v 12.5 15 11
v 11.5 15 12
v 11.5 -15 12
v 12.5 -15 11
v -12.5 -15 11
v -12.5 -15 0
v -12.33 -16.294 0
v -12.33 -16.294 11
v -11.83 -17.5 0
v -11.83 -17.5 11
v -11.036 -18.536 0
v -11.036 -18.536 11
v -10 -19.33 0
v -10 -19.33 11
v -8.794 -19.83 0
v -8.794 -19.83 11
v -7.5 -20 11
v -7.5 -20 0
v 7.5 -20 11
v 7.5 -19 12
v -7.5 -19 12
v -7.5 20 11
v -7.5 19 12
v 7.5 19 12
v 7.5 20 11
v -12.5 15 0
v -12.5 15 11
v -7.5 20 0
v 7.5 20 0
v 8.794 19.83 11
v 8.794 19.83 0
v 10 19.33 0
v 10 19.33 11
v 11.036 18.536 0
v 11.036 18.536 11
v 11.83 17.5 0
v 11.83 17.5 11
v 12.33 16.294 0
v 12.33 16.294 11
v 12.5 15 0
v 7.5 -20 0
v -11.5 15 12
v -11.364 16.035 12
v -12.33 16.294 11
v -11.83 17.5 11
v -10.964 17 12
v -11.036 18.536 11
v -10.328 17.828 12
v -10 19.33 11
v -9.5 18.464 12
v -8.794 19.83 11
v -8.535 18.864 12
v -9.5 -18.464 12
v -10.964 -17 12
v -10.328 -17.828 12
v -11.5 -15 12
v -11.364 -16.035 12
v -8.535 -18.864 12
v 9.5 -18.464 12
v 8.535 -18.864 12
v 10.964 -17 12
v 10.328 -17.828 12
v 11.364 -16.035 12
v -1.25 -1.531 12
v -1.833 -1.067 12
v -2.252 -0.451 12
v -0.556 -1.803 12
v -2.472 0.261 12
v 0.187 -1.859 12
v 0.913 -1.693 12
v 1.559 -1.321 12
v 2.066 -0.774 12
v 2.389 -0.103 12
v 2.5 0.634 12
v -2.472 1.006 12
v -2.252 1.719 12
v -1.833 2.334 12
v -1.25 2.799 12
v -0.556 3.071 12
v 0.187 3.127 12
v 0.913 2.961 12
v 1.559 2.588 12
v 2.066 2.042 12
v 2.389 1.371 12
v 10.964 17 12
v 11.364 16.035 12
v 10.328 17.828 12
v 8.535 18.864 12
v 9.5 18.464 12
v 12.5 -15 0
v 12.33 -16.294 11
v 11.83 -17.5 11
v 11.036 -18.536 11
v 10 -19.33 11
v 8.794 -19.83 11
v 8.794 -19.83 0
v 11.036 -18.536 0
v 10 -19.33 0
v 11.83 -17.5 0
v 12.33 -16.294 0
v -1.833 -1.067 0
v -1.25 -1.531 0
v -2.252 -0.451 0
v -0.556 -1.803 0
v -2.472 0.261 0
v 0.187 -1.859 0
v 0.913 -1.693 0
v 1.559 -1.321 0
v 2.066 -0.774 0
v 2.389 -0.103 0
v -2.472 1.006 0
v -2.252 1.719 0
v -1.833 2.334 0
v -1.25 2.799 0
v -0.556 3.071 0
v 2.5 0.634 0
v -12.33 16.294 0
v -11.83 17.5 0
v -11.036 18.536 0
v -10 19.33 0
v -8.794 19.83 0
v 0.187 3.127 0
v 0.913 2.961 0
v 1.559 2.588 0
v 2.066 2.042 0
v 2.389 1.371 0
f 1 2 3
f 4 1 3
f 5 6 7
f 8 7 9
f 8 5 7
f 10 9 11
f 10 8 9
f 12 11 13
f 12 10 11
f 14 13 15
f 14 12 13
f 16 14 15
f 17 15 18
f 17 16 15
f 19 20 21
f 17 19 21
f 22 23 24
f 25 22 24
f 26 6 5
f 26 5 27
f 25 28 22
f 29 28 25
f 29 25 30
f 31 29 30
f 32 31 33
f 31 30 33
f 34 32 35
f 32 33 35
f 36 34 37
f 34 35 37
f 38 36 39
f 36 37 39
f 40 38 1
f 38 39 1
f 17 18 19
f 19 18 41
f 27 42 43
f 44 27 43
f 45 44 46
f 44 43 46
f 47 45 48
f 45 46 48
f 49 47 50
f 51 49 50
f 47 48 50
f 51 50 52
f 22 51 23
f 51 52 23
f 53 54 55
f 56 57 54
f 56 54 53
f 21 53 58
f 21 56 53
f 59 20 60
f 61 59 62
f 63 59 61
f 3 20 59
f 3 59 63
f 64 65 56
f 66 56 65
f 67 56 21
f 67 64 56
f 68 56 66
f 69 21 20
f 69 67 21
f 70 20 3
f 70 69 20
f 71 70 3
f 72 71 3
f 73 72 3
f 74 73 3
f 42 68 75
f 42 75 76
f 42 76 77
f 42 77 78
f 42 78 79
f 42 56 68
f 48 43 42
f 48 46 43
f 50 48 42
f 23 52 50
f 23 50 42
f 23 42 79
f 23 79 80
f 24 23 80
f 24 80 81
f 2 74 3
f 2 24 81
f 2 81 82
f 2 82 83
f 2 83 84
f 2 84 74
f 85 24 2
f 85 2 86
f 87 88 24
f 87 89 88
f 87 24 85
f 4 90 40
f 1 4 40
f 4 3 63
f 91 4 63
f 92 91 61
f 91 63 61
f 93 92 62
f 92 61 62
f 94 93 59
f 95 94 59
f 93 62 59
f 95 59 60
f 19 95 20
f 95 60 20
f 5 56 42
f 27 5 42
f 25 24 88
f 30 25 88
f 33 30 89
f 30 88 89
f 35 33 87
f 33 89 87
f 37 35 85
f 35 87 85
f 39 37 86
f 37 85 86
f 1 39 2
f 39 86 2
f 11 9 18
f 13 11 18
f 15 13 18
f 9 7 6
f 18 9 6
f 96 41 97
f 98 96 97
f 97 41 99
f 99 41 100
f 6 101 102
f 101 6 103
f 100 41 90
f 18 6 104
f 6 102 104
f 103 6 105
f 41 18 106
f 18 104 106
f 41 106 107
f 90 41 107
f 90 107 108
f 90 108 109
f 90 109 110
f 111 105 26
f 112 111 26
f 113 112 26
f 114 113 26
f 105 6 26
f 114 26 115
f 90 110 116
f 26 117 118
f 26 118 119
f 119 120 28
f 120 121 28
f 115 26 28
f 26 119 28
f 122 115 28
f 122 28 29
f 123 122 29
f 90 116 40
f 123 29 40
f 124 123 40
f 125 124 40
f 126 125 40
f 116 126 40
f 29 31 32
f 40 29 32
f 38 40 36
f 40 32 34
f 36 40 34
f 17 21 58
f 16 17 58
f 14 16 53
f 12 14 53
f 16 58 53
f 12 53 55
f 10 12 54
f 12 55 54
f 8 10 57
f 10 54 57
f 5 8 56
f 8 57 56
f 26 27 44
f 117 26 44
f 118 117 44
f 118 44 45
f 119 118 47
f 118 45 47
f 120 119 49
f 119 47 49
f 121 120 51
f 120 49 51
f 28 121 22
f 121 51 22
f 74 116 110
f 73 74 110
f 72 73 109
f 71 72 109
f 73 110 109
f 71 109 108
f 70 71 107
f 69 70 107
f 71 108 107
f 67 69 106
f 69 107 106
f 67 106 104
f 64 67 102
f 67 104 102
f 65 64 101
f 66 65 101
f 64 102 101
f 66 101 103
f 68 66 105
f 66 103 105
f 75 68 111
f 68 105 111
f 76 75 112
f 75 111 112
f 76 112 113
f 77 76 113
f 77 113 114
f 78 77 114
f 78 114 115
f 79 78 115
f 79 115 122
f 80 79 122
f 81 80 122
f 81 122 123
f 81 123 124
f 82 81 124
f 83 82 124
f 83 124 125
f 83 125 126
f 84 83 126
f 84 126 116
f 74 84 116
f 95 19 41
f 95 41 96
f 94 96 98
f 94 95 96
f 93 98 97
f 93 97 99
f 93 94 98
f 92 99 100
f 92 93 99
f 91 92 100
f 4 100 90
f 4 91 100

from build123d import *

# Parameters (mm, degrees)
F0_W     = 25
F0_H     = 40
F1_DEPTH = 12
F2_R     = 2.5
F3_DEPTH = 123.8
F4_R     = 5
F5_R     = 5
F6_R     = 5
F7_R     = 5
F8_SIZE  = 1


with BuildPart() as f1:
    # F0 (on Top) → F1 (new body)
    with BuildSketch(Plane.XY):
        Rectangle(F0_W, F0_H)
    extrude(amount=F1_DEPTH)

    # F2 (on face) → F3 (cut)
    with BuildSketch(Plane(origin=(0, 0, 0), x_dir=(1, 0, 0), z_dir=(0, 0, -1))):
        with Locations((0, -0.633842)):
            Circle(F2_R)
    extrude(amount=-F3_DEPTH, mode=Mode.SUBTRACT)

    # F4
    f4_edges = [f1.edges().sort_by_distance(p)[0] for p in [
        (-12.5, -20, 6),
    ]]
    fillet(f4_edges, radius=F4_R)

    # F5
    f5_edges = [f1.edges().sort_by_distance(p)[0] for p in [
        (12.5, -20, 6),
    ]]
    fillet(f5_edges, radius=F5_R)

    # F6
    f6_edges = [f1.edges().sort_by_distance(p)[0] for p in [
        (-12.5, 20, 6),
    ]]
    fillet(f6_edges, radius=F6_R)

    # F7
    f7_edges = [f1.edges().sort_by_distance(p)[0] for p in [
        (12.5, 20, 6),
    ]]
    fillet(f7_edges, radius=F7_R)

    # F8
    f8_edges = [f1.edges().sort_by_distance(p)[0] for p in [
        (0, 20, 12),
    ]]
    chamfer(f8_edges, length=F8_SIZE)


solid = f1.part
